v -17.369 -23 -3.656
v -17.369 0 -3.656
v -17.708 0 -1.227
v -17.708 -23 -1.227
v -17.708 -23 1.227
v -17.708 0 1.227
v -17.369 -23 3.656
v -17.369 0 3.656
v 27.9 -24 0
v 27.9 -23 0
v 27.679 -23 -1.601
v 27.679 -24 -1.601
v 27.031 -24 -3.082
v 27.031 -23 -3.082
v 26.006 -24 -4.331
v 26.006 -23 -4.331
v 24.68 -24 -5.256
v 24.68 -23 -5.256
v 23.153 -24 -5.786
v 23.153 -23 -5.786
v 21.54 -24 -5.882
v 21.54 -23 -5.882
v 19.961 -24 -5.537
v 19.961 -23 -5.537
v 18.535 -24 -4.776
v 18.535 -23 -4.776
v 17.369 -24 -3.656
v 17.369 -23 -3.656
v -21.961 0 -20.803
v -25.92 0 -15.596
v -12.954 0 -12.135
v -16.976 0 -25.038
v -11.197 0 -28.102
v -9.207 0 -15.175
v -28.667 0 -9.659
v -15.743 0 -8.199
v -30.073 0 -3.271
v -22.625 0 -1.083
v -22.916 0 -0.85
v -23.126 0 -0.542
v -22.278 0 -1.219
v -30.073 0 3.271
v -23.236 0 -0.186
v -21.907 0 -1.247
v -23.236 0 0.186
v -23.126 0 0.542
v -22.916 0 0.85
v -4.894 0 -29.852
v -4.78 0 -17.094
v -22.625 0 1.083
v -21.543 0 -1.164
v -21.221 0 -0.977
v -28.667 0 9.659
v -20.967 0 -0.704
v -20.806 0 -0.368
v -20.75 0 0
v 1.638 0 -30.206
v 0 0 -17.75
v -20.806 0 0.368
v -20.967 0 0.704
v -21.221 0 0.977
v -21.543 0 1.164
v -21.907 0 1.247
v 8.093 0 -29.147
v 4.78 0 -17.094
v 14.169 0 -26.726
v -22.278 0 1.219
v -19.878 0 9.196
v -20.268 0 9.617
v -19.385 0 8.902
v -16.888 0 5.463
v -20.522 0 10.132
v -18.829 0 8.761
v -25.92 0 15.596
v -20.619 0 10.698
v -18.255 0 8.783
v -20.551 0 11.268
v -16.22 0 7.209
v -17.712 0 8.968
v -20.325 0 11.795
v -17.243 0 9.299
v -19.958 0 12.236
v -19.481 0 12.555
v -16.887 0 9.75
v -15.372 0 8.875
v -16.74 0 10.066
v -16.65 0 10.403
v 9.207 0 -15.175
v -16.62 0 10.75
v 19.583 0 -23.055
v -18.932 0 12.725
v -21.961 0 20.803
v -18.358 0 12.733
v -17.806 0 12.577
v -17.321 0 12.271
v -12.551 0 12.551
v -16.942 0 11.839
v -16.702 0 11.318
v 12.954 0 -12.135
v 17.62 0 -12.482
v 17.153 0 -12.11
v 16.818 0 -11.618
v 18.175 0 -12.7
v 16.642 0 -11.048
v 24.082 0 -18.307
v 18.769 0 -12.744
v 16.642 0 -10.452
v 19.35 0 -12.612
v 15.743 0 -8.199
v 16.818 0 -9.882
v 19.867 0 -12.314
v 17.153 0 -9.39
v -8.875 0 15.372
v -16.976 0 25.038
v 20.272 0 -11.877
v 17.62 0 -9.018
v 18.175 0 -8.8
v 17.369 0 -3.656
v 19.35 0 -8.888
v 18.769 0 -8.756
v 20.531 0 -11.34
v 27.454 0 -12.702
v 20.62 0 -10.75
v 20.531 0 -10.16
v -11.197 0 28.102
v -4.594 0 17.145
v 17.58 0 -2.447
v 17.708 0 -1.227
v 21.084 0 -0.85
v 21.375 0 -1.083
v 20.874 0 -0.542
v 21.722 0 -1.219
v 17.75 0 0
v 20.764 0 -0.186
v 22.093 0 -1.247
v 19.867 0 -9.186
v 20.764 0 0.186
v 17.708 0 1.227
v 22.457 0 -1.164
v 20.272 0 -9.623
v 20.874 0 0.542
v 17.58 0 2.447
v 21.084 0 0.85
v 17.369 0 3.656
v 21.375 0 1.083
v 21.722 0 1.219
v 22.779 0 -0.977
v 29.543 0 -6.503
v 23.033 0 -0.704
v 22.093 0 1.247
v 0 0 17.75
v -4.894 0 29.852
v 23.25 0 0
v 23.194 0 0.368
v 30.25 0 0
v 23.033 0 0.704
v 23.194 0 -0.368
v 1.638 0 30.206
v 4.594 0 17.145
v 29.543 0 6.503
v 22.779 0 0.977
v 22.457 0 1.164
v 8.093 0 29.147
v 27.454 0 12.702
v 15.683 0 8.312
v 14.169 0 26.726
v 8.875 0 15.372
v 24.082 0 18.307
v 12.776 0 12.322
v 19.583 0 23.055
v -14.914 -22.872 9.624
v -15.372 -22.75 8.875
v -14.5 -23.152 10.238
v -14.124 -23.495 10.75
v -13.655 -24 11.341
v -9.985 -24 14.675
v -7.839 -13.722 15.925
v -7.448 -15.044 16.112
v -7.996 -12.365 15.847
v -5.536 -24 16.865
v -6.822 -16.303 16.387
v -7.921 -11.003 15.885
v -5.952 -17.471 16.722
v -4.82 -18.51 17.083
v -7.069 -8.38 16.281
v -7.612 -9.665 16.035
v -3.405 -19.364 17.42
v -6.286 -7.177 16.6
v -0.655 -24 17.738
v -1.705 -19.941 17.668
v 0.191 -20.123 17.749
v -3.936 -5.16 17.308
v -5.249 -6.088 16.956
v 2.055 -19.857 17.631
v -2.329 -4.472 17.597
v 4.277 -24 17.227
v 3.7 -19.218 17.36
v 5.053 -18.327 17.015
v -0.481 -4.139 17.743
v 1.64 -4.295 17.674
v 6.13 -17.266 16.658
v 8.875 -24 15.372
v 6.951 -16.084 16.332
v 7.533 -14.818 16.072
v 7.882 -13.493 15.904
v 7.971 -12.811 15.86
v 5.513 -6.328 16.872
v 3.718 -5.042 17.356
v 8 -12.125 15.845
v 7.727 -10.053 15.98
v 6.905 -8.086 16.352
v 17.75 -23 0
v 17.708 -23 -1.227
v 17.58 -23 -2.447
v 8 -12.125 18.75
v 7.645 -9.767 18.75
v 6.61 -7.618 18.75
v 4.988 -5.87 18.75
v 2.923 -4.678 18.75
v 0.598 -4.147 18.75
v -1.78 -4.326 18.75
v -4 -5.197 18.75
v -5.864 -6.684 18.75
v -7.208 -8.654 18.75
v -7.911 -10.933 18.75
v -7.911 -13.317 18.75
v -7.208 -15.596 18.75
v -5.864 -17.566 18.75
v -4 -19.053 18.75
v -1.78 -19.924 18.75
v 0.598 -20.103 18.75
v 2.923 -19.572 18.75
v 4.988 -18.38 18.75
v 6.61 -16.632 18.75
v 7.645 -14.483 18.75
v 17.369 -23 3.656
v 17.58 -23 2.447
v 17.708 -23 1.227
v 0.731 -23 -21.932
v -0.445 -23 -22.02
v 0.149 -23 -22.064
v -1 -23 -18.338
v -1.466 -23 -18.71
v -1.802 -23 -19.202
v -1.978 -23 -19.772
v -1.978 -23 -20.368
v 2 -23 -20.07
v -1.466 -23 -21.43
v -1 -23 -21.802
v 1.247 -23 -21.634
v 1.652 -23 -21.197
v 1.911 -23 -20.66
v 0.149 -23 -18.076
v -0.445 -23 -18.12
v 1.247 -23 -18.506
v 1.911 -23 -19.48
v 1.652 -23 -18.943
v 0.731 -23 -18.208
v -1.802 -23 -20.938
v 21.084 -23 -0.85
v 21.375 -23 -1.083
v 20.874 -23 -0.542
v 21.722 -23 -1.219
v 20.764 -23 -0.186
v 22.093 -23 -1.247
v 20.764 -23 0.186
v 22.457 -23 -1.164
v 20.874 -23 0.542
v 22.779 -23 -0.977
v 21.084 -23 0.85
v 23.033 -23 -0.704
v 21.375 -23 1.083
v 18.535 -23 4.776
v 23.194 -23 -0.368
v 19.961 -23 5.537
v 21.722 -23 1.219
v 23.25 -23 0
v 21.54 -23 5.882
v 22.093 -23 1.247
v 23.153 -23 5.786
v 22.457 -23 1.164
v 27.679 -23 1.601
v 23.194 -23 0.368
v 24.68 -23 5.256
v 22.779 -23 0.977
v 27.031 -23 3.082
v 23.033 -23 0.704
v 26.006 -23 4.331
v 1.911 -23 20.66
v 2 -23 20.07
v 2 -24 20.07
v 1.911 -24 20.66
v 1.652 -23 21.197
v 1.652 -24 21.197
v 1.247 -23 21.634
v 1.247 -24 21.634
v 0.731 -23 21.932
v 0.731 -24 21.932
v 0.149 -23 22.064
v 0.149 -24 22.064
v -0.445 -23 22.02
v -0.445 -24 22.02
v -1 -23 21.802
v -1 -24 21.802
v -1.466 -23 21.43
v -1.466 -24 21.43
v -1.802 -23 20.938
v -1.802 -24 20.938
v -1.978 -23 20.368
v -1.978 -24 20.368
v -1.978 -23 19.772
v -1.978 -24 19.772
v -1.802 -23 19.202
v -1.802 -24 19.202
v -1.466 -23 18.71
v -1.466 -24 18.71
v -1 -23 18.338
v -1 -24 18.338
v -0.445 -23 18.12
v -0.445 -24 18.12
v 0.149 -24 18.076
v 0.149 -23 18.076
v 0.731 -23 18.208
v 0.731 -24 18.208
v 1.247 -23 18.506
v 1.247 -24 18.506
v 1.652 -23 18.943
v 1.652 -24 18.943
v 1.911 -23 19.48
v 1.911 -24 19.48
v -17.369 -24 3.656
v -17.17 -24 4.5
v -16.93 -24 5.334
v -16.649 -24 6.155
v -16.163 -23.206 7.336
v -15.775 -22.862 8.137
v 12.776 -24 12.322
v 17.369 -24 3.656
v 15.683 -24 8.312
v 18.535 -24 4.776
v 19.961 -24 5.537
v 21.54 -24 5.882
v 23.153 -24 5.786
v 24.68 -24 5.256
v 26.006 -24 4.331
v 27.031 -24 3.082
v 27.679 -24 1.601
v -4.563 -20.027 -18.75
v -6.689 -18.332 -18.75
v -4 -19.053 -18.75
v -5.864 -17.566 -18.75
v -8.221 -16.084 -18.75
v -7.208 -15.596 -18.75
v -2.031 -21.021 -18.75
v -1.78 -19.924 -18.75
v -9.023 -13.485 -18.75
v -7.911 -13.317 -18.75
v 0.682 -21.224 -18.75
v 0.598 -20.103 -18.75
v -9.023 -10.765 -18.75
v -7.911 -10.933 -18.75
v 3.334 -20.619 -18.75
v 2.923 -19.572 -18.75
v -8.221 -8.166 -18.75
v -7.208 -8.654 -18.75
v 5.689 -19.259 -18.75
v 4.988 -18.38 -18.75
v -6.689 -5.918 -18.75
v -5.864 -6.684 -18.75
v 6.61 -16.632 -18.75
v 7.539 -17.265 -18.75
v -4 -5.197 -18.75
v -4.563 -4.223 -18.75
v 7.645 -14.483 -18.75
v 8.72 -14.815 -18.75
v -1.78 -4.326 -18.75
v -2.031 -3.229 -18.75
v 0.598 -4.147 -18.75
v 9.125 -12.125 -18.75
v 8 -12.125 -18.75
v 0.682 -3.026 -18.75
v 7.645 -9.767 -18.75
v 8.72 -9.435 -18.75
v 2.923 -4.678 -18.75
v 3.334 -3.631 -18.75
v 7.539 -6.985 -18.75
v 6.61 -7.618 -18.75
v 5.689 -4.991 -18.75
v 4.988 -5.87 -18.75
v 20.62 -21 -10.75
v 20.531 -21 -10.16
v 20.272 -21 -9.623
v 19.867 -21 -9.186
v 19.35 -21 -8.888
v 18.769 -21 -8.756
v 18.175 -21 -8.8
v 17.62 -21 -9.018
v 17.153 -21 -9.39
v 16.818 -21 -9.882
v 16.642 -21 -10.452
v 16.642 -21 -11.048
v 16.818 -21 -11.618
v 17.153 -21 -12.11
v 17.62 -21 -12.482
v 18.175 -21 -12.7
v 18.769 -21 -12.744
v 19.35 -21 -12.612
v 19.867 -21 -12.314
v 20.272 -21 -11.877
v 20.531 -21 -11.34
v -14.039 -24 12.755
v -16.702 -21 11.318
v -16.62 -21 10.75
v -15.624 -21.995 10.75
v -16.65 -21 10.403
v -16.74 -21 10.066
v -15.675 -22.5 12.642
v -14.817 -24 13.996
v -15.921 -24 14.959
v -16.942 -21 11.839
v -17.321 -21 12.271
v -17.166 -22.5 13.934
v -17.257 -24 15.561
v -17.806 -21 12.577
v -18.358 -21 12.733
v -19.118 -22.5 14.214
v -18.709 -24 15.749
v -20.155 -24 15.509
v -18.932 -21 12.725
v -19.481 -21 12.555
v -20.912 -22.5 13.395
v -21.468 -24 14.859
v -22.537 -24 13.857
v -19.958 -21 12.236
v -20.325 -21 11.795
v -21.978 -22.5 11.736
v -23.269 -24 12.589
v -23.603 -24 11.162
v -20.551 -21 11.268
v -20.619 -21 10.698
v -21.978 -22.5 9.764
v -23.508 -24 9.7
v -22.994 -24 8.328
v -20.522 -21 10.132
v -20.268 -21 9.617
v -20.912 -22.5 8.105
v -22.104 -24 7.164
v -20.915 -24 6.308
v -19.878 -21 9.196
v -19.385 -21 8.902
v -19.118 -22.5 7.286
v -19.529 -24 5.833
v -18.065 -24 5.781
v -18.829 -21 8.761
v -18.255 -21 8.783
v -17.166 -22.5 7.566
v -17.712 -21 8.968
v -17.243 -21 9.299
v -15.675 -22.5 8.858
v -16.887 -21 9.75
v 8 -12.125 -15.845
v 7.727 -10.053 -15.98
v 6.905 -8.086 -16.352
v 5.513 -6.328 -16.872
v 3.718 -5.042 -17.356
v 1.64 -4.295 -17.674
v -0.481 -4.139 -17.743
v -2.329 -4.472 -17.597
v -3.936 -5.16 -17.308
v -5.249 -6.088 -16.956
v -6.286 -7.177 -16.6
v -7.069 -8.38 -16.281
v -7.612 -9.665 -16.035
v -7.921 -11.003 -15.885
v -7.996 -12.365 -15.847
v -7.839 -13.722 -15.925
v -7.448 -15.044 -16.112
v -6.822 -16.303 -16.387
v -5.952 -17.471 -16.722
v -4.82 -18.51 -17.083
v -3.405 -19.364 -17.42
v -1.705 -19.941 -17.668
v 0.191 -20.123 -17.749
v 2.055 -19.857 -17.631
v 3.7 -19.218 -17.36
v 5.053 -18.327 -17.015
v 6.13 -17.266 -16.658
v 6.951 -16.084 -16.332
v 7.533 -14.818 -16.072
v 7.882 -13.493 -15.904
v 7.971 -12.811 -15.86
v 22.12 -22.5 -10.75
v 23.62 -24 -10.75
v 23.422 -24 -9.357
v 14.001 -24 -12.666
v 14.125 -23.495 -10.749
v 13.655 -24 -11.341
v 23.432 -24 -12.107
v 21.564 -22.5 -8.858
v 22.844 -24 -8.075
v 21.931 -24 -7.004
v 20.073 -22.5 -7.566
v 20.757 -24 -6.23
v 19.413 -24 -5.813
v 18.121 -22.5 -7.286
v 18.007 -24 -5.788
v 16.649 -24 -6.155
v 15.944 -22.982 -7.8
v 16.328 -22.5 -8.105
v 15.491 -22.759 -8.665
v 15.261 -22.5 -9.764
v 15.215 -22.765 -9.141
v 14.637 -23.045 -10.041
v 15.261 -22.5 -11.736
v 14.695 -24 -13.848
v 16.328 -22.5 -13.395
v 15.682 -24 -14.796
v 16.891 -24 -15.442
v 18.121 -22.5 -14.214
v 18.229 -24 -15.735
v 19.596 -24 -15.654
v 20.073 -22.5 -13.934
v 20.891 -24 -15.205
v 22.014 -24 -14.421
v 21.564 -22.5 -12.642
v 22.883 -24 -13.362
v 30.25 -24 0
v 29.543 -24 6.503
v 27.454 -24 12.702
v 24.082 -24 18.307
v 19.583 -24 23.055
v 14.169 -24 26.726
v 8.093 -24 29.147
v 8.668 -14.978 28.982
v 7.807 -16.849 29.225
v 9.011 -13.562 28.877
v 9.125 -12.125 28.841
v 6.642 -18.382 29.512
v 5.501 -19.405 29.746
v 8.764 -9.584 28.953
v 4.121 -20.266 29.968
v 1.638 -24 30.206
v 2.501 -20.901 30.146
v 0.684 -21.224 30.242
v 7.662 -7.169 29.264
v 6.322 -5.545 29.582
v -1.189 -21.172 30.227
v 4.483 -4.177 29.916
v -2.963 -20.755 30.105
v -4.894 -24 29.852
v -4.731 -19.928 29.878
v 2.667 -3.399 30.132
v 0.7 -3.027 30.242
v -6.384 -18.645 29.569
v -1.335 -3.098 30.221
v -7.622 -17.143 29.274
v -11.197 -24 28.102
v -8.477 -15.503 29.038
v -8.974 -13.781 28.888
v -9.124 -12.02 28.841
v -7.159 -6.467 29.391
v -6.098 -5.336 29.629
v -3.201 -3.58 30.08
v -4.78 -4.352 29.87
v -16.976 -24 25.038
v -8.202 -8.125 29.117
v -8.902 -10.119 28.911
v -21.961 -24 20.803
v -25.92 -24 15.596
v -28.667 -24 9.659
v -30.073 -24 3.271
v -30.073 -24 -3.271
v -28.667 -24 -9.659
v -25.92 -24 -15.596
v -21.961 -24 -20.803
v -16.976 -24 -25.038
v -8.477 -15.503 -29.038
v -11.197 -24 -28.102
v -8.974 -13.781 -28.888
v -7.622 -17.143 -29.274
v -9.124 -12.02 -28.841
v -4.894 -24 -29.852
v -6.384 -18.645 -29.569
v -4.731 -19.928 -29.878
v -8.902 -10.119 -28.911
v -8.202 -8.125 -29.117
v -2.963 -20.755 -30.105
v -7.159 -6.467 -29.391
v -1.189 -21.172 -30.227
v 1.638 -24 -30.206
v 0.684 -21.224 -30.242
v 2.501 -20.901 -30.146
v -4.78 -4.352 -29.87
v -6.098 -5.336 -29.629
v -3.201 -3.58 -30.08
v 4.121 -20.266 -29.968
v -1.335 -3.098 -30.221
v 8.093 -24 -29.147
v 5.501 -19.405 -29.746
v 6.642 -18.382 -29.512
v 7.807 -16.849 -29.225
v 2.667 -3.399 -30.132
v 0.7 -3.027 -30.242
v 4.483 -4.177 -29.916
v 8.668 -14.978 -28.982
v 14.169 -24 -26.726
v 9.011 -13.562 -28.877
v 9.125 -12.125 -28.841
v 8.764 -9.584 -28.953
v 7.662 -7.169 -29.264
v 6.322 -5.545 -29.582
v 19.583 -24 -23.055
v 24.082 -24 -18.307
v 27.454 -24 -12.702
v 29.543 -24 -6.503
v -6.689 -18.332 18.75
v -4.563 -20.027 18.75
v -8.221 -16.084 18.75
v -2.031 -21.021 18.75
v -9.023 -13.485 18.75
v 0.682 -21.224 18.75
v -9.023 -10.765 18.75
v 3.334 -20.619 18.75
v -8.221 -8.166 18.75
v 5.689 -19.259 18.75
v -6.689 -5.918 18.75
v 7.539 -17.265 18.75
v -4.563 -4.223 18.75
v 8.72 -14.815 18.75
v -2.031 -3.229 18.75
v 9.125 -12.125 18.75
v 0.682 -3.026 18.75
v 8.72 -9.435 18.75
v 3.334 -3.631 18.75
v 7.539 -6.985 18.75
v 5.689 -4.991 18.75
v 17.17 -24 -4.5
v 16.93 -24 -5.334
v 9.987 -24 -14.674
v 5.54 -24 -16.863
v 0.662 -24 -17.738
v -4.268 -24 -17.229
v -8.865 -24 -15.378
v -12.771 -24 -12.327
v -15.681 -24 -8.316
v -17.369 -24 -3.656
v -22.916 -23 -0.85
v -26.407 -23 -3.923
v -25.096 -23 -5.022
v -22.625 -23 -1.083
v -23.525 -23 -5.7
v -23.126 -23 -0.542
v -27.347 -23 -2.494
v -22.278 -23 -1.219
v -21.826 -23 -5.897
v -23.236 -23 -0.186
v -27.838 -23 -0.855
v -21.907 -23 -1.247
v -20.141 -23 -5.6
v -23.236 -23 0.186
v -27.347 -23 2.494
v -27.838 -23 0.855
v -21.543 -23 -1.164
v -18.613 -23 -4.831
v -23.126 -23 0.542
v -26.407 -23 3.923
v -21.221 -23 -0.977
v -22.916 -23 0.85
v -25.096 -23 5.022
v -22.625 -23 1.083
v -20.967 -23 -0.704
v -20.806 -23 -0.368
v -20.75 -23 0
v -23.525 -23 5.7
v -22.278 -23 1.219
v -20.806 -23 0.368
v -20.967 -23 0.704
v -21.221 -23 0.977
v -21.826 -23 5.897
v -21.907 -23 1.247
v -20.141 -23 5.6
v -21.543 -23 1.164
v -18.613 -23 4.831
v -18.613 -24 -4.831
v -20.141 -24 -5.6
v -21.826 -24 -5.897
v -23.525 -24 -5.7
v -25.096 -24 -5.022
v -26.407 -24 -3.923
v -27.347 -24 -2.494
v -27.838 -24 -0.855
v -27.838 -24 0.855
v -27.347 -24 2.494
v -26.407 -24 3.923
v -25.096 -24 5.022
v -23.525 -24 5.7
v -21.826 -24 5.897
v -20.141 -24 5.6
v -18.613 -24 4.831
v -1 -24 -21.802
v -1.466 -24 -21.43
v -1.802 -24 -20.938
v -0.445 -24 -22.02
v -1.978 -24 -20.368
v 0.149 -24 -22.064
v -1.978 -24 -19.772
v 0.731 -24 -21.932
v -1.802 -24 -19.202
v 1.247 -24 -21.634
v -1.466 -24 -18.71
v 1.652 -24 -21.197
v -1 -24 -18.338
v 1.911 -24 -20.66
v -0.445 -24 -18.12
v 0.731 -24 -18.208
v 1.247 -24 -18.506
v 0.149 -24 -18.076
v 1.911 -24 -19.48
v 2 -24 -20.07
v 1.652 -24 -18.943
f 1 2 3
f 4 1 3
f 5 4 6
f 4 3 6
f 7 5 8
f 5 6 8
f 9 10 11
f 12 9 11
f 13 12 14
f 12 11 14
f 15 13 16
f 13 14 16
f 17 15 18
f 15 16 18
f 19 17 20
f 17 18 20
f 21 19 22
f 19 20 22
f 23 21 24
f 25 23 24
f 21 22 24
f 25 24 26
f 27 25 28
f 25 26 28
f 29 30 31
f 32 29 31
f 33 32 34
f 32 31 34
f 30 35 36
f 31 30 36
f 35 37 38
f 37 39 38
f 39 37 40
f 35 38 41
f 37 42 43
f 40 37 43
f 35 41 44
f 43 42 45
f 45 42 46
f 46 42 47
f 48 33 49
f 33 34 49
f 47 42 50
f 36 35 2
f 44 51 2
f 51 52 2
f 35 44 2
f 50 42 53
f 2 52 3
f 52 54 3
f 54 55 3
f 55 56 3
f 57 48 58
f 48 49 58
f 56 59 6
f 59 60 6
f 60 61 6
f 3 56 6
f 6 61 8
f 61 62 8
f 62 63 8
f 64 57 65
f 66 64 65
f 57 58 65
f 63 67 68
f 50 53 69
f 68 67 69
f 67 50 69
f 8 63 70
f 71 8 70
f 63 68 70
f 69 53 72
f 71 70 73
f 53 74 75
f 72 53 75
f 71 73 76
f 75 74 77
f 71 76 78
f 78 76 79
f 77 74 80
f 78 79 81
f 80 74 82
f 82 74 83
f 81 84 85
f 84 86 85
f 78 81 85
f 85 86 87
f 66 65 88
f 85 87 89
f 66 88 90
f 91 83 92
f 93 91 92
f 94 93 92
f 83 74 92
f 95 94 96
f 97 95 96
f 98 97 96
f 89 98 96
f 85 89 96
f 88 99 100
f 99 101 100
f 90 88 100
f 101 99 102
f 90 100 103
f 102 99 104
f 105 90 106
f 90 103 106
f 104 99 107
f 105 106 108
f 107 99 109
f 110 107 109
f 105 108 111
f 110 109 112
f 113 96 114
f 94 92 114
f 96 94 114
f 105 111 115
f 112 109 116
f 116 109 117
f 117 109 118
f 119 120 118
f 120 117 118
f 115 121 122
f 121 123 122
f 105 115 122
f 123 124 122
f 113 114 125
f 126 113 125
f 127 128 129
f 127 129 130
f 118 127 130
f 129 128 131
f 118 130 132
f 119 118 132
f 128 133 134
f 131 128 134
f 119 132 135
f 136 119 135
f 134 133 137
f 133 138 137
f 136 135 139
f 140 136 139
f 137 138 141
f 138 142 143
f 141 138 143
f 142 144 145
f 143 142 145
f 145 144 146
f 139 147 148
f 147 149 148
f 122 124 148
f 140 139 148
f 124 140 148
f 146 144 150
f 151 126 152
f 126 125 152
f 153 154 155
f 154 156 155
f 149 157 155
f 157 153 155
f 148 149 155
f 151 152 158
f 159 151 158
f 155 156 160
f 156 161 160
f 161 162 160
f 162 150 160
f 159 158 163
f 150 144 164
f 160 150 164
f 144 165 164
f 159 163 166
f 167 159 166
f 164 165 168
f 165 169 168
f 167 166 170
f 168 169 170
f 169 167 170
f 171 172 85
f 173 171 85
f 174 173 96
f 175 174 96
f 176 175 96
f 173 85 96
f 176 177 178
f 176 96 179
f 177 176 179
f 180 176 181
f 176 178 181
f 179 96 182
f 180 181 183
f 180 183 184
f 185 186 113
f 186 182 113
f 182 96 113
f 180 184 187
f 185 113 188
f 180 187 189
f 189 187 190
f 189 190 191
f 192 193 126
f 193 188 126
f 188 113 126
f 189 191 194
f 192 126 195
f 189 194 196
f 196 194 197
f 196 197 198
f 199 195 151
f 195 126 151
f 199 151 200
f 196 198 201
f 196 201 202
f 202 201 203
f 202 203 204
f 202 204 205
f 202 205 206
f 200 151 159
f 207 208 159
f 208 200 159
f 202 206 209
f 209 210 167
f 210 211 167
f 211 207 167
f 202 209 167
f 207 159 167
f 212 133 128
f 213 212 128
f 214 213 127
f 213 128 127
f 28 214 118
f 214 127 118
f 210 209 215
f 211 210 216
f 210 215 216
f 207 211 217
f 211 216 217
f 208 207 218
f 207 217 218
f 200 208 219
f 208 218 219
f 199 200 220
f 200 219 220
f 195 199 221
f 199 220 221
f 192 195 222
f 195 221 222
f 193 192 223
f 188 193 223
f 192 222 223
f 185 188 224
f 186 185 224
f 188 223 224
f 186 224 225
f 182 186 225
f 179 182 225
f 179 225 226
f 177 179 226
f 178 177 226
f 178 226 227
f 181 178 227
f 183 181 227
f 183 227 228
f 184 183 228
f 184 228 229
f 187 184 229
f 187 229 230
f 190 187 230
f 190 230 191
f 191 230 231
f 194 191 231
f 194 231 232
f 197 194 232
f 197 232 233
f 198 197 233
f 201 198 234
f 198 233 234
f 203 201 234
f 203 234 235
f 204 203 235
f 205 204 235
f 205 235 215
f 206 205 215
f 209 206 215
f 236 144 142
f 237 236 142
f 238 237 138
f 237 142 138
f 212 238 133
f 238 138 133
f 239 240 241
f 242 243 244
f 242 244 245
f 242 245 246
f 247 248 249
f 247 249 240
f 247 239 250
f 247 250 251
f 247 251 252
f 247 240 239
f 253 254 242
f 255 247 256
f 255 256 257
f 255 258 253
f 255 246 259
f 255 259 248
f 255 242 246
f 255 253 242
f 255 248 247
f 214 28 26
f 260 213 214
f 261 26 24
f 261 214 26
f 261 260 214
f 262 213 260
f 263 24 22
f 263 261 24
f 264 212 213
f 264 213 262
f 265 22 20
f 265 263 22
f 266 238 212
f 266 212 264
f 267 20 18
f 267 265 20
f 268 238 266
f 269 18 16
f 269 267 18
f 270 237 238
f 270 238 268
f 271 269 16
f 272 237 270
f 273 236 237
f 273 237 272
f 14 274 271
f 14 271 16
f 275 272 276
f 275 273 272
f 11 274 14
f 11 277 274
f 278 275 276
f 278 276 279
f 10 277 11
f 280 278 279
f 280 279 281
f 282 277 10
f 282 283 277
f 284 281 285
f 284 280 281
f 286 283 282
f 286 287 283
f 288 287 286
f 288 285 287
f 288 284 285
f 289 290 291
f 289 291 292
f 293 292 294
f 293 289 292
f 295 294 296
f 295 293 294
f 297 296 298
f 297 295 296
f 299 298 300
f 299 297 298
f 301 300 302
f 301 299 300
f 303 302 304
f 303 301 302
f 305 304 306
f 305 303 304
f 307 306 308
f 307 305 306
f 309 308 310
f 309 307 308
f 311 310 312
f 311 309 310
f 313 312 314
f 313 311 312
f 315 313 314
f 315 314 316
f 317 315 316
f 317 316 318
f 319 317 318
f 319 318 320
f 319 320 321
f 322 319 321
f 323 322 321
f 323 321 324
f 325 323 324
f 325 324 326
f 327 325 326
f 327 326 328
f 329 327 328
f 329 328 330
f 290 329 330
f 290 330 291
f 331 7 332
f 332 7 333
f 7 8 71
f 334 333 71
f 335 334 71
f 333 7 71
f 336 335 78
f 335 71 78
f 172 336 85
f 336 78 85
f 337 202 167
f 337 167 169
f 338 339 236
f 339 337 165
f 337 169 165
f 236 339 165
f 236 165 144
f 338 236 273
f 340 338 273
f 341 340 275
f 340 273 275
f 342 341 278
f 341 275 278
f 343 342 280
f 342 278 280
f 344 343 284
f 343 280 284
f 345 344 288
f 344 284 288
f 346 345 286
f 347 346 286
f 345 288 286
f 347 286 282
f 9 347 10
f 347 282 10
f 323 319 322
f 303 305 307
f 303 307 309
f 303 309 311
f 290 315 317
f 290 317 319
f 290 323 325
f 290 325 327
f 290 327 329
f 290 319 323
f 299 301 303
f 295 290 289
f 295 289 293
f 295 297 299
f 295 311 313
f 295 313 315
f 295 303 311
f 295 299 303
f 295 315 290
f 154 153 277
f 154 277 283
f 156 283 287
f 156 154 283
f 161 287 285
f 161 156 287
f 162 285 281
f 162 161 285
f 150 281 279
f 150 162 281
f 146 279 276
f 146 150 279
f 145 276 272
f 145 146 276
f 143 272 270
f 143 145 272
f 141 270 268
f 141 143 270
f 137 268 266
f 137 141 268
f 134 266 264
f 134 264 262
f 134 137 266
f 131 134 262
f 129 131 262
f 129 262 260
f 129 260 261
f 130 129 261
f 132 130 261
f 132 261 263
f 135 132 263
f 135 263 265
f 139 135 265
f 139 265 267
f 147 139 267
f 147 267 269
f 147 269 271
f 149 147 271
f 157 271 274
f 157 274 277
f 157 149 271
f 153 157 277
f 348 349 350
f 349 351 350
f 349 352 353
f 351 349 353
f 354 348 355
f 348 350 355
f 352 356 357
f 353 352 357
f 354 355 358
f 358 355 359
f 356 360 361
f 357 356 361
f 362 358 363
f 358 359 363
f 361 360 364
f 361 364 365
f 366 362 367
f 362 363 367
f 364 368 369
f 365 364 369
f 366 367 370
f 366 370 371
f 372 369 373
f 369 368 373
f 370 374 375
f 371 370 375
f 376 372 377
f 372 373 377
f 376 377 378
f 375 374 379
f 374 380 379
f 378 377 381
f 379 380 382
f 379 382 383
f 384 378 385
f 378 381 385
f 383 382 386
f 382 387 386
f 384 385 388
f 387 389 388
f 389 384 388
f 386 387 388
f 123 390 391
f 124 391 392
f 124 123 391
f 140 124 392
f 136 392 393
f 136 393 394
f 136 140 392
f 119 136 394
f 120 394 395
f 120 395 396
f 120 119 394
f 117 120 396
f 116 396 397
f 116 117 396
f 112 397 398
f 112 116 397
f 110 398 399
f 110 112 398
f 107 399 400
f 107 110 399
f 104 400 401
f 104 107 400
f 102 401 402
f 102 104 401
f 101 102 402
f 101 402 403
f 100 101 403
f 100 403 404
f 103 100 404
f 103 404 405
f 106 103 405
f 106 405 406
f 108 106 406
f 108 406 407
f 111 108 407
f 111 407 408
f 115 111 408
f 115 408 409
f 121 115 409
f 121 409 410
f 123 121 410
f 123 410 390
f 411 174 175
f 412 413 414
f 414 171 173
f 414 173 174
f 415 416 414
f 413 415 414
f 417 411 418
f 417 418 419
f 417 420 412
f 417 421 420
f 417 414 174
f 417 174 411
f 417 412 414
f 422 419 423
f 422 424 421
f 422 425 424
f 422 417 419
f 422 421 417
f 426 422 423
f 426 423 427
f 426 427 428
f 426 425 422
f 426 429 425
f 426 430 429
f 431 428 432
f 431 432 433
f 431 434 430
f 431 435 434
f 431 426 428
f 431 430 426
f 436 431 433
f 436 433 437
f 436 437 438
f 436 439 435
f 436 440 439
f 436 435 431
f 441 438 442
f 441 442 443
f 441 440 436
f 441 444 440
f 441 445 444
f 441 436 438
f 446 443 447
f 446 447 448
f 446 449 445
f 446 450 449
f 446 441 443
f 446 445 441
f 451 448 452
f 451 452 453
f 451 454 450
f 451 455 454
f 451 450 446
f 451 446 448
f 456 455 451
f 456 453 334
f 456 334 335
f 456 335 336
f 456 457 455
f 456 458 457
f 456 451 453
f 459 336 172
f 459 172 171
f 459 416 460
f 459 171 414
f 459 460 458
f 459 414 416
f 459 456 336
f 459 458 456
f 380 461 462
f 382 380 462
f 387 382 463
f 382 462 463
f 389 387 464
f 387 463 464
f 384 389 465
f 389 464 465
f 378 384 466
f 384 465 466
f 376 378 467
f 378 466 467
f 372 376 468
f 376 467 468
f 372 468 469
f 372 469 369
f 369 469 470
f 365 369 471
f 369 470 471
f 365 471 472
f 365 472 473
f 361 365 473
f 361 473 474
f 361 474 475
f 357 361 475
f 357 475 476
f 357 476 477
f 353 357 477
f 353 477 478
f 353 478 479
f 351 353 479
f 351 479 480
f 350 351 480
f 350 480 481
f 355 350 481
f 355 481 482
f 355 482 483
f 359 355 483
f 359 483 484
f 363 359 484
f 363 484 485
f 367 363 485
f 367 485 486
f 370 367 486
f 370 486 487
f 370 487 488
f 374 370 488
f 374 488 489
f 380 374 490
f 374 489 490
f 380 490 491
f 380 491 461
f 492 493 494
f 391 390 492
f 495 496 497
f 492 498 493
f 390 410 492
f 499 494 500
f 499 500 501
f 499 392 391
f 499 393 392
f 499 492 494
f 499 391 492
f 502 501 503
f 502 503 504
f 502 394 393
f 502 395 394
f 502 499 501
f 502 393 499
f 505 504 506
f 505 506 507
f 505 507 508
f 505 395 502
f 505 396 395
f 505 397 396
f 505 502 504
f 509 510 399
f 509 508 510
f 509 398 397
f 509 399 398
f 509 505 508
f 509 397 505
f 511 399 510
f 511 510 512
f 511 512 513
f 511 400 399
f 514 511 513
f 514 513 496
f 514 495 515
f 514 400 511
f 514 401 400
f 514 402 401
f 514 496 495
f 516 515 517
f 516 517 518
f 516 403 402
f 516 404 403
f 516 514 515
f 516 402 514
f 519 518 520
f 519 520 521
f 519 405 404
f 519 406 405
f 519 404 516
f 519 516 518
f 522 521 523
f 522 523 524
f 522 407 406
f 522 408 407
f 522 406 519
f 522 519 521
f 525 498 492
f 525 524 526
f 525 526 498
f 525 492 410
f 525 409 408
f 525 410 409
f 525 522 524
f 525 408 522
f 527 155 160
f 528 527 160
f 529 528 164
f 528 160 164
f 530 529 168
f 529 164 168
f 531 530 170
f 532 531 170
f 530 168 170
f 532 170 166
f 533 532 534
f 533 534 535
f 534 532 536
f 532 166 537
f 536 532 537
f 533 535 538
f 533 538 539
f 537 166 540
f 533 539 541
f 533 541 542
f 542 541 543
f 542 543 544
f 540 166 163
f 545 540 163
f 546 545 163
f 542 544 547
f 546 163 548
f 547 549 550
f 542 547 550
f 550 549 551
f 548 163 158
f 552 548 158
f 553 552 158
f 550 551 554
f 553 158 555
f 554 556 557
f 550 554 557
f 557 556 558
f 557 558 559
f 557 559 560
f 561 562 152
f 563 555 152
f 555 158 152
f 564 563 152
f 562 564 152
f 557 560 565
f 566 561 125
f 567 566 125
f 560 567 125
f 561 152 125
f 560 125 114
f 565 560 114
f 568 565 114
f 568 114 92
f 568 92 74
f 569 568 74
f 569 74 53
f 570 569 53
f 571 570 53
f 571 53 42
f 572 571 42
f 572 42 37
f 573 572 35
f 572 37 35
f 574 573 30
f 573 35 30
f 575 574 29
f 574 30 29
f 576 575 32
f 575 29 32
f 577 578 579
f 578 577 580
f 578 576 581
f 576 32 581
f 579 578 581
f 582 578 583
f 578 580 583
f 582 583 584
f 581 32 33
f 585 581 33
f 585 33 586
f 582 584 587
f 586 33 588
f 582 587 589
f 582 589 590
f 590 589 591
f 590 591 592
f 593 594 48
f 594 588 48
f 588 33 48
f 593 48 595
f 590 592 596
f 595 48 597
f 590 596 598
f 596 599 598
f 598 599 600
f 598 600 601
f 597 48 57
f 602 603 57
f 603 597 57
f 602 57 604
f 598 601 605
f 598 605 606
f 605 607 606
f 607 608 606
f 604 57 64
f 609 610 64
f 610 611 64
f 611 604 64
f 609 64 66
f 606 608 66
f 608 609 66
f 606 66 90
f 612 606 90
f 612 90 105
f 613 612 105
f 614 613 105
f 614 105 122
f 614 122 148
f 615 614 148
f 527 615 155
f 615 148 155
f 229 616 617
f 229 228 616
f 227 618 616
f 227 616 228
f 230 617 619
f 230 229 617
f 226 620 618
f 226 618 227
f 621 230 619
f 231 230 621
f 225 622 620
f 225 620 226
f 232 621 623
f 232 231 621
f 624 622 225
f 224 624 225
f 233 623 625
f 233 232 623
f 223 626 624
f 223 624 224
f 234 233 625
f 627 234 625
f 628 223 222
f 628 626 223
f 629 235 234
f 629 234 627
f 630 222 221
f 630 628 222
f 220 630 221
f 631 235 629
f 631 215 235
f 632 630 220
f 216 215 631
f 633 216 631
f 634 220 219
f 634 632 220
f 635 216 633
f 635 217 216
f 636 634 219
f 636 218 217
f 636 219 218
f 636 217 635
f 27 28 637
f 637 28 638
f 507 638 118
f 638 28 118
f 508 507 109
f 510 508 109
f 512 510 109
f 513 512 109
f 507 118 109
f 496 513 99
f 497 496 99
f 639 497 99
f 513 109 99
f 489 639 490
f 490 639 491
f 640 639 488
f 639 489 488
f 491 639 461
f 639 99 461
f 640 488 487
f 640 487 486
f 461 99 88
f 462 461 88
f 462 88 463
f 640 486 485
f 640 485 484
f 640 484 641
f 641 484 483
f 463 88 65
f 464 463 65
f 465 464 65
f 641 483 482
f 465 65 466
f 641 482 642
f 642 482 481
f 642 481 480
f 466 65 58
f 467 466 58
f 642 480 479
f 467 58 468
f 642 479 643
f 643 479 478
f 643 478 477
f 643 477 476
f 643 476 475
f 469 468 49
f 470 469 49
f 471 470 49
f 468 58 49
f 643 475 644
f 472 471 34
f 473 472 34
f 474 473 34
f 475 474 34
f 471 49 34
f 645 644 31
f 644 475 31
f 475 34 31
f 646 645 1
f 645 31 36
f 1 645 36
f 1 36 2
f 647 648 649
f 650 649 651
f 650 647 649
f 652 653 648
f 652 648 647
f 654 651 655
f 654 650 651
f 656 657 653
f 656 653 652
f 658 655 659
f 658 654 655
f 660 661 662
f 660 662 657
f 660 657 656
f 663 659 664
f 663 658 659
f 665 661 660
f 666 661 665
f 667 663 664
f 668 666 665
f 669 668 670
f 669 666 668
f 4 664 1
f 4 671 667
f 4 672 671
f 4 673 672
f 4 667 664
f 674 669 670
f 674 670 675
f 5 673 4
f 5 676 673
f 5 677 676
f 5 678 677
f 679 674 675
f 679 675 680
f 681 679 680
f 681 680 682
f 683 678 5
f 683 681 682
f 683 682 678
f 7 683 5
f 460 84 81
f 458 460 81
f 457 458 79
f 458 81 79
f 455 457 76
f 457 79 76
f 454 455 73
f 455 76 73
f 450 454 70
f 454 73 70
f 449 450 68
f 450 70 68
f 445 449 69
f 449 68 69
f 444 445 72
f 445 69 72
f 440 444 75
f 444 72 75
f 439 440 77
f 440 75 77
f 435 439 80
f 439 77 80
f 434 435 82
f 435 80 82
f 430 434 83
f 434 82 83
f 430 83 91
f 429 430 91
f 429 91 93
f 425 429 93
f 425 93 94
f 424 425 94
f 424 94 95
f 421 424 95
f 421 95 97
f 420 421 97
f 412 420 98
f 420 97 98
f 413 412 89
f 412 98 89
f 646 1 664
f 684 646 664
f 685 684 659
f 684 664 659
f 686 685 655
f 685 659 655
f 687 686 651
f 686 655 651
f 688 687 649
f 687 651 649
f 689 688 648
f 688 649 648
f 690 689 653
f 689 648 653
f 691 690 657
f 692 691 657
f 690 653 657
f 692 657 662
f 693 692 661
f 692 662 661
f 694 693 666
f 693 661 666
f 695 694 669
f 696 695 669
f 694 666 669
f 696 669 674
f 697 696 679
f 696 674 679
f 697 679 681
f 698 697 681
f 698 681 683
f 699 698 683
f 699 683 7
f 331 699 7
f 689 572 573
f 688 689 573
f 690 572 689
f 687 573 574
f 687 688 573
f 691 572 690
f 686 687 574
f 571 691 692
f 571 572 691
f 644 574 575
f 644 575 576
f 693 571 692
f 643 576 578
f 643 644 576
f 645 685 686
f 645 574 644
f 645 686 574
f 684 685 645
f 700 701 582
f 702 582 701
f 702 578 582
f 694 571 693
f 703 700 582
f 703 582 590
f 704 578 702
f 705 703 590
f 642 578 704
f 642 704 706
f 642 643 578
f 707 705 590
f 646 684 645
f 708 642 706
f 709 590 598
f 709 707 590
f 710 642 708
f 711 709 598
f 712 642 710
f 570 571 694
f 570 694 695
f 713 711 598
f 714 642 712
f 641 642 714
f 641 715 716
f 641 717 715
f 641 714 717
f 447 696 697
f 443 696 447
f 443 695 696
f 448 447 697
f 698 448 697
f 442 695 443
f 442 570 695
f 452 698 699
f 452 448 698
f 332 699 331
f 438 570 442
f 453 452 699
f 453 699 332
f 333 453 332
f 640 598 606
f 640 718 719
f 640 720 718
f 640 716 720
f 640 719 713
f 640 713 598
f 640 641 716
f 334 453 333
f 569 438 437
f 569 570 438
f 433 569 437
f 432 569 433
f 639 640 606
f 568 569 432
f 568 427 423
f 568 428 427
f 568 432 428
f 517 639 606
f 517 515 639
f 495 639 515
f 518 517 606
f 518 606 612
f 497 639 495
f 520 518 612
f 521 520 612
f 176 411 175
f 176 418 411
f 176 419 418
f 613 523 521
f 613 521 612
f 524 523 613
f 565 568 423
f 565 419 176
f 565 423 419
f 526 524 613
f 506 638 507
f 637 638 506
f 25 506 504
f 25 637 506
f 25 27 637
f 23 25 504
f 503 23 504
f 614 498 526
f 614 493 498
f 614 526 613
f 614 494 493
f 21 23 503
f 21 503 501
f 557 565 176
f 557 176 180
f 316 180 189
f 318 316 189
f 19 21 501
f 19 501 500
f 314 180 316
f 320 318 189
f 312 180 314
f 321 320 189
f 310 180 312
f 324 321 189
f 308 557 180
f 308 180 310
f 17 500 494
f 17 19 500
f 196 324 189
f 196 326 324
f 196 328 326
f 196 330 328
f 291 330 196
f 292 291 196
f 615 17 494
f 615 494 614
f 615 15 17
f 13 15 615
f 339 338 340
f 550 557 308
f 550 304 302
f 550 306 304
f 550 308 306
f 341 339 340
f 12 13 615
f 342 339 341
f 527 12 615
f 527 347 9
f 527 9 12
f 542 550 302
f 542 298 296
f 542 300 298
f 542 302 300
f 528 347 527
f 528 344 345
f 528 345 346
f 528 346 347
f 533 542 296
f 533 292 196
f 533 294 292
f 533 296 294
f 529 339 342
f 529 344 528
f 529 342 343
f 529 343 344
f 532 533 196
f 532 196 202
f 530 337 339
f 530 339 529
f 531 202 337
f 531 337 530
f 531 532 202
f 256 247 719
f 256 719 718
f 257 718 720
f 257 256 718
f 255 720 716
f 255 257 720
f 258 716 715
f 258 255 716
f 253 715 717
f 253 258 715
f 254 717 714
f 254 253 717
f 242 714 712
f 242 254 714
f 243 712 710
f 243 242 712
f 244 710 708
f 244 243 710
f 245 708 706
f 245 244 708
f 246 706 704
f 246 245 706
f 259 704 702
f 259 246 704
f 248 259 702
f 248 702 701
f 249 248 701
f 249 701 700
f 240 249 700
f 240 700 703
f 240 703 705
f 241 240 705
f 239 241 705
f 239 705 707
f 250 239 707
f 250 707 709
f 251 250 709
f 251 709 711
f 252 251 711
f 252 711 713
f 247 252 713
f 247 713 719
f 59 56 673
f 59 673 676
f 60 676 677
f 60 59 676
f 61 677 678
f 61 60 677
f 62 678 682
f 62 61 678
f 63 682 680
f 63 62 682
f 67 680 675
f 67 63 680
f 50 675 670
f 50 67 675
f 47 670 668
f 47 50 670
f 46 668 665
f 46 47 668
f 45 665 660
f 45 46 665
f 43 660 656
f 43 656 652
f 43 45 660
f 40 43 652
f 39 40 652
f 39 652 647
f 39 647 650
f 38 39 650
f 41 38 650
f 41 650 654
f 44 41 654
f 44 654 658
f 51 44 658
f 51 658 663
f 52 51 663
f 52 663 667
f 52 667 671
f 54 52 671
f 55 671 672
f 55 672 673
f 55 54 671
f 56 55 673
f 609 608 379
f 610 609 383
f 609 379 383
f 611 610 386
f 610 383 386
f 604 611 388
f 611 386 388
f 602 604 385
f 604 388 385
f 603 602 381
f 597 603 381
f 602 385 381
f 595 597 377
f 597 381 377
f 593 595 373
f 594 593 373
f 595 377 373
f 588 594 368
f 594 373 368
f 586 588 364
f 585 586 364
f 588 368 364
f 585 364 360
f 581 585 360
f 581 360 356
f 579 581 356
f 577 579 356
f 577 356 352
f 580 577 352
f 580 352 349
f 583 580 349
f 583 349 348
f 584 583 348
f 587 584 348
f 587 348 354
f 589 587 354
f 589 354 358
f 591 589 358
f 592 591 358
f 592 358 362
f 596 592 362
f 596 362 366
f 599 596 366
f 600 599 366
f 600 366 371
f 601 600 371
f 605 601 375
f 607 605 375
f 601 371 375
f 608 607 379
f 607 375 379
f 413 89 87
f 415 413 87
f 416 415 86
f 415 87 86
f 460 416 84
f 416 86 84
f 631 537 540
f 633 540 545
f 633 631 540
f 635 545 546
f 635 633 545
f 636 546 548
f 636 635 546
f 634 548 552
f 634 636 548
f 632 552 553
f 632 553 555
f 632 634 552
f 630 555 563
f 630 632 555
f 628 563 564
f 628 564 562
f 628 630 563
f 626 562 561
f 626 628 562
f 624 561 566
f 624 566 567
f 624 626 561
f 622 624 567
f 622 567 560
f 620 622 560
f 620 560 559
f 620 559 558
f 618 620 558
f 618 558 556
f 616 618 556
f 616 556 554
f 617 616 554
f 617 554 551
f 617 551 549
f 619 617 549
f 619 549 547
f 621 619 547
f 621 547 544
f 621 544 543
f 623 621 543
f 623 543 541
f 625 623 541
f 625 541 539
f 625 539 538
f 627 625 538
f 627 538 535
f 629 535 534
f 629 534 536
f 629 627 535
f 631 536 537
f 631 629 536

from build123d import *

# Parameters (mm, degrees)
F0_R          = 30.25
F0_R_2        = 2
F1_DEPTH      = 24
F0_R_3        = 1.25
F2_DEPTH      = 23
F5_R          = 9.125
F5_R_2        = 8
F6_DEPTH      = 25
F7_DEPTH      = 60
F7_DEPTH_BACK = 30
F8_START      = -37.5
F8_DEPTH      = 45.7


# Not quite as in the source:
# - a fillet or chamfer that OpenCascade refuses, or shapes differently, is made with other operations: its cross-section is extruded or revolved along the edge and cut away or added


with BuildPart() as f1:
    # F0 (on Front) → F1 (new body)
    with BuildSketch(Plane.XZ):
        Circle(F0_R)
        with Locations((0, -20.07)):
            Circle(F0_R_2, mode=Mode.SUBTRACT)
        with Locations((18.6195461814, -10.75)):
            Circle(F0_R_2, mode=Mode.SUBTRACT)
        with BuildLine():
            ThreePointArc((-16.6195461814, 10.75), (-16.6876945288, 10.2323619098), (-16.8874953738, 9.75))
            ThreePointArc((-16.8874953738, 9.75), (-20.5513978339, 11.2676380902), (-16.6195461814, 10.75))
        make_face(mode=Mode.SUBTRACT)
        with BuildLine():
            ThreePointArc((8.875, 15.3719509172), (14.3703479176, 10.4190019065), (17.369375, 3.6561334917))
            ThreePointArc((17.369375, 3.6561334917), (23.9351114309, 5.5736293158), (27.9, 0))
            ThreePointArc((27.9, 0), (23.9351114309, -5.5736293158), (17.369375, -3.6561334917))
            ThreePointArc((17.369375, -3.6561334917), (0, -17.75), (-17.369375, -3.6561334917))
            ThreePointArc((-17.369375, -3.6561334917), (-27.9, 0), (-17.369375, 3.6561334917))
            ThreePointArc((-17.369375, 3.6561334917), (-16.5773263107, 6.3446632999), (-15.3719509172, 8.875))
            ThreePointArc((-15.3719509172, 8.875), (-4.5940380506, 17.1451834166), (8.875, 15.3719509172))
        make_face(mode=Mode.SUBTRACT)
        with Locations((0, 20.07)):
            Circle(F0_R_2, mode=Mode.SUBTRACT)
    extrude(amount=F1_DEPTH)

    # F0 (on Front) → F2 (join)
    with BuildSketch(Plane.XZ):
        with BuildLine():
            ThreePointArc((-17.369375, 3.6561334917), (-27.9, 0), (-17.369375, -3.6561334917))
            ThreePointArc((-17.369375, -3.6561334917), (-17.75, 0), (-17.369375, 3.6561334917))
        make_face()
        with Locations((-22, 0)):
            Circle(F0_R_3, mode=Mode.SUBTRACT)
        with Locations((0, 20.07)):
            Circle(F0_R_2)
        with BuildLine():
            ThreePointArc((17.369375, 3.6561334917), (17.6545873111, 1.8379463744), (17.75, 0))
            ThreePointArc((17.75, 0), (17.6545873111, -1.8379463744), (17.369375, -3.6561334917))
            ThreePointArc((17.369375, -3.6561334917), (23.9351114309, -5.5736293158), (27.9, 0))
            ThreePointArc((27.9, 0), (23.9351114309, 5.5736293158), (17.369375, 3.6561334917))
        make_face()
        with Locations((22, 0)):
            Circle(F0_R_3, mode=Mode.SUBTRACT)
        with Locations((0, -20.07)):
            Circle(F0_R_2)
    extrude(amount=F2_DEPTH)

    # F3: chamfer of 3 on 2 edges, made by hand

    # F3_s1 → F3_t2 (revolve, cut)
    with BuildSketch(Plane.XY.offset(10.75)):
        Polygon((-13.6195461814, -24), (-16.6195461814, -21), (-16.6195461814, -24), align=None)
    revolve(axis=Axis((-18.6195461814, -24, 10.75), (0, -1, 0)), mode=Mode.SUBTRACT)

    # F3_s3 → F3_t4 (revolve, cut)
    with BuildSketch(Plane.XY.offset(-10.75)):
        Polygon((23.6195461814, -24), (20.6195461814, -21), (20.6195461814, -24), align=None)
    revolve(axis=Axis((18.6195461814, -24, -10.75), (0, -1, 0)), mode=Mode.SUBTRACT)

    # F5 (on offset) → F6 (cut)
    with BuildSketch(Plane.XY.offset(18.75)):
        with Locations((0, -12.125)):
            Circle(F5_R)
        with Locations((0, -12.125)):
            Circle(F5_R_2, mode=Mode.SUBTRACT)
    extrude(amount=F6_DEPTH, mode=Mode.SUBTRACT)

    # F5 (on offset) → F7 (cut, two sides)
    with BuildSketch(Plane.XY.offset(18.75)) as f7_sk:
        with Locations((0, -12.125)):
            Circle(F5_R_2)
    extrude(amount=-F7_DEPTH, mode=Mode.SUBTRACT)
    extrude(f7_sk.sketch, amount=F7_DEPTH_BACK, mode=Mode.SUBTRACT)

    # F5 (on offset) → F8 (cut)
    with BuildSketch(Plane.XY.offset(18.75).offset(F8_START)):
        with Locations((0, -12.125)):
            Circle(F5_R)
        with Locations((0, -12.125)):
            Circle(F5_R_2, mode=Mode.SUBTRACT)
    extrude(amount=-F8_DEPTH, mode=Mode.SUBTRACT)


solid = f1.part
